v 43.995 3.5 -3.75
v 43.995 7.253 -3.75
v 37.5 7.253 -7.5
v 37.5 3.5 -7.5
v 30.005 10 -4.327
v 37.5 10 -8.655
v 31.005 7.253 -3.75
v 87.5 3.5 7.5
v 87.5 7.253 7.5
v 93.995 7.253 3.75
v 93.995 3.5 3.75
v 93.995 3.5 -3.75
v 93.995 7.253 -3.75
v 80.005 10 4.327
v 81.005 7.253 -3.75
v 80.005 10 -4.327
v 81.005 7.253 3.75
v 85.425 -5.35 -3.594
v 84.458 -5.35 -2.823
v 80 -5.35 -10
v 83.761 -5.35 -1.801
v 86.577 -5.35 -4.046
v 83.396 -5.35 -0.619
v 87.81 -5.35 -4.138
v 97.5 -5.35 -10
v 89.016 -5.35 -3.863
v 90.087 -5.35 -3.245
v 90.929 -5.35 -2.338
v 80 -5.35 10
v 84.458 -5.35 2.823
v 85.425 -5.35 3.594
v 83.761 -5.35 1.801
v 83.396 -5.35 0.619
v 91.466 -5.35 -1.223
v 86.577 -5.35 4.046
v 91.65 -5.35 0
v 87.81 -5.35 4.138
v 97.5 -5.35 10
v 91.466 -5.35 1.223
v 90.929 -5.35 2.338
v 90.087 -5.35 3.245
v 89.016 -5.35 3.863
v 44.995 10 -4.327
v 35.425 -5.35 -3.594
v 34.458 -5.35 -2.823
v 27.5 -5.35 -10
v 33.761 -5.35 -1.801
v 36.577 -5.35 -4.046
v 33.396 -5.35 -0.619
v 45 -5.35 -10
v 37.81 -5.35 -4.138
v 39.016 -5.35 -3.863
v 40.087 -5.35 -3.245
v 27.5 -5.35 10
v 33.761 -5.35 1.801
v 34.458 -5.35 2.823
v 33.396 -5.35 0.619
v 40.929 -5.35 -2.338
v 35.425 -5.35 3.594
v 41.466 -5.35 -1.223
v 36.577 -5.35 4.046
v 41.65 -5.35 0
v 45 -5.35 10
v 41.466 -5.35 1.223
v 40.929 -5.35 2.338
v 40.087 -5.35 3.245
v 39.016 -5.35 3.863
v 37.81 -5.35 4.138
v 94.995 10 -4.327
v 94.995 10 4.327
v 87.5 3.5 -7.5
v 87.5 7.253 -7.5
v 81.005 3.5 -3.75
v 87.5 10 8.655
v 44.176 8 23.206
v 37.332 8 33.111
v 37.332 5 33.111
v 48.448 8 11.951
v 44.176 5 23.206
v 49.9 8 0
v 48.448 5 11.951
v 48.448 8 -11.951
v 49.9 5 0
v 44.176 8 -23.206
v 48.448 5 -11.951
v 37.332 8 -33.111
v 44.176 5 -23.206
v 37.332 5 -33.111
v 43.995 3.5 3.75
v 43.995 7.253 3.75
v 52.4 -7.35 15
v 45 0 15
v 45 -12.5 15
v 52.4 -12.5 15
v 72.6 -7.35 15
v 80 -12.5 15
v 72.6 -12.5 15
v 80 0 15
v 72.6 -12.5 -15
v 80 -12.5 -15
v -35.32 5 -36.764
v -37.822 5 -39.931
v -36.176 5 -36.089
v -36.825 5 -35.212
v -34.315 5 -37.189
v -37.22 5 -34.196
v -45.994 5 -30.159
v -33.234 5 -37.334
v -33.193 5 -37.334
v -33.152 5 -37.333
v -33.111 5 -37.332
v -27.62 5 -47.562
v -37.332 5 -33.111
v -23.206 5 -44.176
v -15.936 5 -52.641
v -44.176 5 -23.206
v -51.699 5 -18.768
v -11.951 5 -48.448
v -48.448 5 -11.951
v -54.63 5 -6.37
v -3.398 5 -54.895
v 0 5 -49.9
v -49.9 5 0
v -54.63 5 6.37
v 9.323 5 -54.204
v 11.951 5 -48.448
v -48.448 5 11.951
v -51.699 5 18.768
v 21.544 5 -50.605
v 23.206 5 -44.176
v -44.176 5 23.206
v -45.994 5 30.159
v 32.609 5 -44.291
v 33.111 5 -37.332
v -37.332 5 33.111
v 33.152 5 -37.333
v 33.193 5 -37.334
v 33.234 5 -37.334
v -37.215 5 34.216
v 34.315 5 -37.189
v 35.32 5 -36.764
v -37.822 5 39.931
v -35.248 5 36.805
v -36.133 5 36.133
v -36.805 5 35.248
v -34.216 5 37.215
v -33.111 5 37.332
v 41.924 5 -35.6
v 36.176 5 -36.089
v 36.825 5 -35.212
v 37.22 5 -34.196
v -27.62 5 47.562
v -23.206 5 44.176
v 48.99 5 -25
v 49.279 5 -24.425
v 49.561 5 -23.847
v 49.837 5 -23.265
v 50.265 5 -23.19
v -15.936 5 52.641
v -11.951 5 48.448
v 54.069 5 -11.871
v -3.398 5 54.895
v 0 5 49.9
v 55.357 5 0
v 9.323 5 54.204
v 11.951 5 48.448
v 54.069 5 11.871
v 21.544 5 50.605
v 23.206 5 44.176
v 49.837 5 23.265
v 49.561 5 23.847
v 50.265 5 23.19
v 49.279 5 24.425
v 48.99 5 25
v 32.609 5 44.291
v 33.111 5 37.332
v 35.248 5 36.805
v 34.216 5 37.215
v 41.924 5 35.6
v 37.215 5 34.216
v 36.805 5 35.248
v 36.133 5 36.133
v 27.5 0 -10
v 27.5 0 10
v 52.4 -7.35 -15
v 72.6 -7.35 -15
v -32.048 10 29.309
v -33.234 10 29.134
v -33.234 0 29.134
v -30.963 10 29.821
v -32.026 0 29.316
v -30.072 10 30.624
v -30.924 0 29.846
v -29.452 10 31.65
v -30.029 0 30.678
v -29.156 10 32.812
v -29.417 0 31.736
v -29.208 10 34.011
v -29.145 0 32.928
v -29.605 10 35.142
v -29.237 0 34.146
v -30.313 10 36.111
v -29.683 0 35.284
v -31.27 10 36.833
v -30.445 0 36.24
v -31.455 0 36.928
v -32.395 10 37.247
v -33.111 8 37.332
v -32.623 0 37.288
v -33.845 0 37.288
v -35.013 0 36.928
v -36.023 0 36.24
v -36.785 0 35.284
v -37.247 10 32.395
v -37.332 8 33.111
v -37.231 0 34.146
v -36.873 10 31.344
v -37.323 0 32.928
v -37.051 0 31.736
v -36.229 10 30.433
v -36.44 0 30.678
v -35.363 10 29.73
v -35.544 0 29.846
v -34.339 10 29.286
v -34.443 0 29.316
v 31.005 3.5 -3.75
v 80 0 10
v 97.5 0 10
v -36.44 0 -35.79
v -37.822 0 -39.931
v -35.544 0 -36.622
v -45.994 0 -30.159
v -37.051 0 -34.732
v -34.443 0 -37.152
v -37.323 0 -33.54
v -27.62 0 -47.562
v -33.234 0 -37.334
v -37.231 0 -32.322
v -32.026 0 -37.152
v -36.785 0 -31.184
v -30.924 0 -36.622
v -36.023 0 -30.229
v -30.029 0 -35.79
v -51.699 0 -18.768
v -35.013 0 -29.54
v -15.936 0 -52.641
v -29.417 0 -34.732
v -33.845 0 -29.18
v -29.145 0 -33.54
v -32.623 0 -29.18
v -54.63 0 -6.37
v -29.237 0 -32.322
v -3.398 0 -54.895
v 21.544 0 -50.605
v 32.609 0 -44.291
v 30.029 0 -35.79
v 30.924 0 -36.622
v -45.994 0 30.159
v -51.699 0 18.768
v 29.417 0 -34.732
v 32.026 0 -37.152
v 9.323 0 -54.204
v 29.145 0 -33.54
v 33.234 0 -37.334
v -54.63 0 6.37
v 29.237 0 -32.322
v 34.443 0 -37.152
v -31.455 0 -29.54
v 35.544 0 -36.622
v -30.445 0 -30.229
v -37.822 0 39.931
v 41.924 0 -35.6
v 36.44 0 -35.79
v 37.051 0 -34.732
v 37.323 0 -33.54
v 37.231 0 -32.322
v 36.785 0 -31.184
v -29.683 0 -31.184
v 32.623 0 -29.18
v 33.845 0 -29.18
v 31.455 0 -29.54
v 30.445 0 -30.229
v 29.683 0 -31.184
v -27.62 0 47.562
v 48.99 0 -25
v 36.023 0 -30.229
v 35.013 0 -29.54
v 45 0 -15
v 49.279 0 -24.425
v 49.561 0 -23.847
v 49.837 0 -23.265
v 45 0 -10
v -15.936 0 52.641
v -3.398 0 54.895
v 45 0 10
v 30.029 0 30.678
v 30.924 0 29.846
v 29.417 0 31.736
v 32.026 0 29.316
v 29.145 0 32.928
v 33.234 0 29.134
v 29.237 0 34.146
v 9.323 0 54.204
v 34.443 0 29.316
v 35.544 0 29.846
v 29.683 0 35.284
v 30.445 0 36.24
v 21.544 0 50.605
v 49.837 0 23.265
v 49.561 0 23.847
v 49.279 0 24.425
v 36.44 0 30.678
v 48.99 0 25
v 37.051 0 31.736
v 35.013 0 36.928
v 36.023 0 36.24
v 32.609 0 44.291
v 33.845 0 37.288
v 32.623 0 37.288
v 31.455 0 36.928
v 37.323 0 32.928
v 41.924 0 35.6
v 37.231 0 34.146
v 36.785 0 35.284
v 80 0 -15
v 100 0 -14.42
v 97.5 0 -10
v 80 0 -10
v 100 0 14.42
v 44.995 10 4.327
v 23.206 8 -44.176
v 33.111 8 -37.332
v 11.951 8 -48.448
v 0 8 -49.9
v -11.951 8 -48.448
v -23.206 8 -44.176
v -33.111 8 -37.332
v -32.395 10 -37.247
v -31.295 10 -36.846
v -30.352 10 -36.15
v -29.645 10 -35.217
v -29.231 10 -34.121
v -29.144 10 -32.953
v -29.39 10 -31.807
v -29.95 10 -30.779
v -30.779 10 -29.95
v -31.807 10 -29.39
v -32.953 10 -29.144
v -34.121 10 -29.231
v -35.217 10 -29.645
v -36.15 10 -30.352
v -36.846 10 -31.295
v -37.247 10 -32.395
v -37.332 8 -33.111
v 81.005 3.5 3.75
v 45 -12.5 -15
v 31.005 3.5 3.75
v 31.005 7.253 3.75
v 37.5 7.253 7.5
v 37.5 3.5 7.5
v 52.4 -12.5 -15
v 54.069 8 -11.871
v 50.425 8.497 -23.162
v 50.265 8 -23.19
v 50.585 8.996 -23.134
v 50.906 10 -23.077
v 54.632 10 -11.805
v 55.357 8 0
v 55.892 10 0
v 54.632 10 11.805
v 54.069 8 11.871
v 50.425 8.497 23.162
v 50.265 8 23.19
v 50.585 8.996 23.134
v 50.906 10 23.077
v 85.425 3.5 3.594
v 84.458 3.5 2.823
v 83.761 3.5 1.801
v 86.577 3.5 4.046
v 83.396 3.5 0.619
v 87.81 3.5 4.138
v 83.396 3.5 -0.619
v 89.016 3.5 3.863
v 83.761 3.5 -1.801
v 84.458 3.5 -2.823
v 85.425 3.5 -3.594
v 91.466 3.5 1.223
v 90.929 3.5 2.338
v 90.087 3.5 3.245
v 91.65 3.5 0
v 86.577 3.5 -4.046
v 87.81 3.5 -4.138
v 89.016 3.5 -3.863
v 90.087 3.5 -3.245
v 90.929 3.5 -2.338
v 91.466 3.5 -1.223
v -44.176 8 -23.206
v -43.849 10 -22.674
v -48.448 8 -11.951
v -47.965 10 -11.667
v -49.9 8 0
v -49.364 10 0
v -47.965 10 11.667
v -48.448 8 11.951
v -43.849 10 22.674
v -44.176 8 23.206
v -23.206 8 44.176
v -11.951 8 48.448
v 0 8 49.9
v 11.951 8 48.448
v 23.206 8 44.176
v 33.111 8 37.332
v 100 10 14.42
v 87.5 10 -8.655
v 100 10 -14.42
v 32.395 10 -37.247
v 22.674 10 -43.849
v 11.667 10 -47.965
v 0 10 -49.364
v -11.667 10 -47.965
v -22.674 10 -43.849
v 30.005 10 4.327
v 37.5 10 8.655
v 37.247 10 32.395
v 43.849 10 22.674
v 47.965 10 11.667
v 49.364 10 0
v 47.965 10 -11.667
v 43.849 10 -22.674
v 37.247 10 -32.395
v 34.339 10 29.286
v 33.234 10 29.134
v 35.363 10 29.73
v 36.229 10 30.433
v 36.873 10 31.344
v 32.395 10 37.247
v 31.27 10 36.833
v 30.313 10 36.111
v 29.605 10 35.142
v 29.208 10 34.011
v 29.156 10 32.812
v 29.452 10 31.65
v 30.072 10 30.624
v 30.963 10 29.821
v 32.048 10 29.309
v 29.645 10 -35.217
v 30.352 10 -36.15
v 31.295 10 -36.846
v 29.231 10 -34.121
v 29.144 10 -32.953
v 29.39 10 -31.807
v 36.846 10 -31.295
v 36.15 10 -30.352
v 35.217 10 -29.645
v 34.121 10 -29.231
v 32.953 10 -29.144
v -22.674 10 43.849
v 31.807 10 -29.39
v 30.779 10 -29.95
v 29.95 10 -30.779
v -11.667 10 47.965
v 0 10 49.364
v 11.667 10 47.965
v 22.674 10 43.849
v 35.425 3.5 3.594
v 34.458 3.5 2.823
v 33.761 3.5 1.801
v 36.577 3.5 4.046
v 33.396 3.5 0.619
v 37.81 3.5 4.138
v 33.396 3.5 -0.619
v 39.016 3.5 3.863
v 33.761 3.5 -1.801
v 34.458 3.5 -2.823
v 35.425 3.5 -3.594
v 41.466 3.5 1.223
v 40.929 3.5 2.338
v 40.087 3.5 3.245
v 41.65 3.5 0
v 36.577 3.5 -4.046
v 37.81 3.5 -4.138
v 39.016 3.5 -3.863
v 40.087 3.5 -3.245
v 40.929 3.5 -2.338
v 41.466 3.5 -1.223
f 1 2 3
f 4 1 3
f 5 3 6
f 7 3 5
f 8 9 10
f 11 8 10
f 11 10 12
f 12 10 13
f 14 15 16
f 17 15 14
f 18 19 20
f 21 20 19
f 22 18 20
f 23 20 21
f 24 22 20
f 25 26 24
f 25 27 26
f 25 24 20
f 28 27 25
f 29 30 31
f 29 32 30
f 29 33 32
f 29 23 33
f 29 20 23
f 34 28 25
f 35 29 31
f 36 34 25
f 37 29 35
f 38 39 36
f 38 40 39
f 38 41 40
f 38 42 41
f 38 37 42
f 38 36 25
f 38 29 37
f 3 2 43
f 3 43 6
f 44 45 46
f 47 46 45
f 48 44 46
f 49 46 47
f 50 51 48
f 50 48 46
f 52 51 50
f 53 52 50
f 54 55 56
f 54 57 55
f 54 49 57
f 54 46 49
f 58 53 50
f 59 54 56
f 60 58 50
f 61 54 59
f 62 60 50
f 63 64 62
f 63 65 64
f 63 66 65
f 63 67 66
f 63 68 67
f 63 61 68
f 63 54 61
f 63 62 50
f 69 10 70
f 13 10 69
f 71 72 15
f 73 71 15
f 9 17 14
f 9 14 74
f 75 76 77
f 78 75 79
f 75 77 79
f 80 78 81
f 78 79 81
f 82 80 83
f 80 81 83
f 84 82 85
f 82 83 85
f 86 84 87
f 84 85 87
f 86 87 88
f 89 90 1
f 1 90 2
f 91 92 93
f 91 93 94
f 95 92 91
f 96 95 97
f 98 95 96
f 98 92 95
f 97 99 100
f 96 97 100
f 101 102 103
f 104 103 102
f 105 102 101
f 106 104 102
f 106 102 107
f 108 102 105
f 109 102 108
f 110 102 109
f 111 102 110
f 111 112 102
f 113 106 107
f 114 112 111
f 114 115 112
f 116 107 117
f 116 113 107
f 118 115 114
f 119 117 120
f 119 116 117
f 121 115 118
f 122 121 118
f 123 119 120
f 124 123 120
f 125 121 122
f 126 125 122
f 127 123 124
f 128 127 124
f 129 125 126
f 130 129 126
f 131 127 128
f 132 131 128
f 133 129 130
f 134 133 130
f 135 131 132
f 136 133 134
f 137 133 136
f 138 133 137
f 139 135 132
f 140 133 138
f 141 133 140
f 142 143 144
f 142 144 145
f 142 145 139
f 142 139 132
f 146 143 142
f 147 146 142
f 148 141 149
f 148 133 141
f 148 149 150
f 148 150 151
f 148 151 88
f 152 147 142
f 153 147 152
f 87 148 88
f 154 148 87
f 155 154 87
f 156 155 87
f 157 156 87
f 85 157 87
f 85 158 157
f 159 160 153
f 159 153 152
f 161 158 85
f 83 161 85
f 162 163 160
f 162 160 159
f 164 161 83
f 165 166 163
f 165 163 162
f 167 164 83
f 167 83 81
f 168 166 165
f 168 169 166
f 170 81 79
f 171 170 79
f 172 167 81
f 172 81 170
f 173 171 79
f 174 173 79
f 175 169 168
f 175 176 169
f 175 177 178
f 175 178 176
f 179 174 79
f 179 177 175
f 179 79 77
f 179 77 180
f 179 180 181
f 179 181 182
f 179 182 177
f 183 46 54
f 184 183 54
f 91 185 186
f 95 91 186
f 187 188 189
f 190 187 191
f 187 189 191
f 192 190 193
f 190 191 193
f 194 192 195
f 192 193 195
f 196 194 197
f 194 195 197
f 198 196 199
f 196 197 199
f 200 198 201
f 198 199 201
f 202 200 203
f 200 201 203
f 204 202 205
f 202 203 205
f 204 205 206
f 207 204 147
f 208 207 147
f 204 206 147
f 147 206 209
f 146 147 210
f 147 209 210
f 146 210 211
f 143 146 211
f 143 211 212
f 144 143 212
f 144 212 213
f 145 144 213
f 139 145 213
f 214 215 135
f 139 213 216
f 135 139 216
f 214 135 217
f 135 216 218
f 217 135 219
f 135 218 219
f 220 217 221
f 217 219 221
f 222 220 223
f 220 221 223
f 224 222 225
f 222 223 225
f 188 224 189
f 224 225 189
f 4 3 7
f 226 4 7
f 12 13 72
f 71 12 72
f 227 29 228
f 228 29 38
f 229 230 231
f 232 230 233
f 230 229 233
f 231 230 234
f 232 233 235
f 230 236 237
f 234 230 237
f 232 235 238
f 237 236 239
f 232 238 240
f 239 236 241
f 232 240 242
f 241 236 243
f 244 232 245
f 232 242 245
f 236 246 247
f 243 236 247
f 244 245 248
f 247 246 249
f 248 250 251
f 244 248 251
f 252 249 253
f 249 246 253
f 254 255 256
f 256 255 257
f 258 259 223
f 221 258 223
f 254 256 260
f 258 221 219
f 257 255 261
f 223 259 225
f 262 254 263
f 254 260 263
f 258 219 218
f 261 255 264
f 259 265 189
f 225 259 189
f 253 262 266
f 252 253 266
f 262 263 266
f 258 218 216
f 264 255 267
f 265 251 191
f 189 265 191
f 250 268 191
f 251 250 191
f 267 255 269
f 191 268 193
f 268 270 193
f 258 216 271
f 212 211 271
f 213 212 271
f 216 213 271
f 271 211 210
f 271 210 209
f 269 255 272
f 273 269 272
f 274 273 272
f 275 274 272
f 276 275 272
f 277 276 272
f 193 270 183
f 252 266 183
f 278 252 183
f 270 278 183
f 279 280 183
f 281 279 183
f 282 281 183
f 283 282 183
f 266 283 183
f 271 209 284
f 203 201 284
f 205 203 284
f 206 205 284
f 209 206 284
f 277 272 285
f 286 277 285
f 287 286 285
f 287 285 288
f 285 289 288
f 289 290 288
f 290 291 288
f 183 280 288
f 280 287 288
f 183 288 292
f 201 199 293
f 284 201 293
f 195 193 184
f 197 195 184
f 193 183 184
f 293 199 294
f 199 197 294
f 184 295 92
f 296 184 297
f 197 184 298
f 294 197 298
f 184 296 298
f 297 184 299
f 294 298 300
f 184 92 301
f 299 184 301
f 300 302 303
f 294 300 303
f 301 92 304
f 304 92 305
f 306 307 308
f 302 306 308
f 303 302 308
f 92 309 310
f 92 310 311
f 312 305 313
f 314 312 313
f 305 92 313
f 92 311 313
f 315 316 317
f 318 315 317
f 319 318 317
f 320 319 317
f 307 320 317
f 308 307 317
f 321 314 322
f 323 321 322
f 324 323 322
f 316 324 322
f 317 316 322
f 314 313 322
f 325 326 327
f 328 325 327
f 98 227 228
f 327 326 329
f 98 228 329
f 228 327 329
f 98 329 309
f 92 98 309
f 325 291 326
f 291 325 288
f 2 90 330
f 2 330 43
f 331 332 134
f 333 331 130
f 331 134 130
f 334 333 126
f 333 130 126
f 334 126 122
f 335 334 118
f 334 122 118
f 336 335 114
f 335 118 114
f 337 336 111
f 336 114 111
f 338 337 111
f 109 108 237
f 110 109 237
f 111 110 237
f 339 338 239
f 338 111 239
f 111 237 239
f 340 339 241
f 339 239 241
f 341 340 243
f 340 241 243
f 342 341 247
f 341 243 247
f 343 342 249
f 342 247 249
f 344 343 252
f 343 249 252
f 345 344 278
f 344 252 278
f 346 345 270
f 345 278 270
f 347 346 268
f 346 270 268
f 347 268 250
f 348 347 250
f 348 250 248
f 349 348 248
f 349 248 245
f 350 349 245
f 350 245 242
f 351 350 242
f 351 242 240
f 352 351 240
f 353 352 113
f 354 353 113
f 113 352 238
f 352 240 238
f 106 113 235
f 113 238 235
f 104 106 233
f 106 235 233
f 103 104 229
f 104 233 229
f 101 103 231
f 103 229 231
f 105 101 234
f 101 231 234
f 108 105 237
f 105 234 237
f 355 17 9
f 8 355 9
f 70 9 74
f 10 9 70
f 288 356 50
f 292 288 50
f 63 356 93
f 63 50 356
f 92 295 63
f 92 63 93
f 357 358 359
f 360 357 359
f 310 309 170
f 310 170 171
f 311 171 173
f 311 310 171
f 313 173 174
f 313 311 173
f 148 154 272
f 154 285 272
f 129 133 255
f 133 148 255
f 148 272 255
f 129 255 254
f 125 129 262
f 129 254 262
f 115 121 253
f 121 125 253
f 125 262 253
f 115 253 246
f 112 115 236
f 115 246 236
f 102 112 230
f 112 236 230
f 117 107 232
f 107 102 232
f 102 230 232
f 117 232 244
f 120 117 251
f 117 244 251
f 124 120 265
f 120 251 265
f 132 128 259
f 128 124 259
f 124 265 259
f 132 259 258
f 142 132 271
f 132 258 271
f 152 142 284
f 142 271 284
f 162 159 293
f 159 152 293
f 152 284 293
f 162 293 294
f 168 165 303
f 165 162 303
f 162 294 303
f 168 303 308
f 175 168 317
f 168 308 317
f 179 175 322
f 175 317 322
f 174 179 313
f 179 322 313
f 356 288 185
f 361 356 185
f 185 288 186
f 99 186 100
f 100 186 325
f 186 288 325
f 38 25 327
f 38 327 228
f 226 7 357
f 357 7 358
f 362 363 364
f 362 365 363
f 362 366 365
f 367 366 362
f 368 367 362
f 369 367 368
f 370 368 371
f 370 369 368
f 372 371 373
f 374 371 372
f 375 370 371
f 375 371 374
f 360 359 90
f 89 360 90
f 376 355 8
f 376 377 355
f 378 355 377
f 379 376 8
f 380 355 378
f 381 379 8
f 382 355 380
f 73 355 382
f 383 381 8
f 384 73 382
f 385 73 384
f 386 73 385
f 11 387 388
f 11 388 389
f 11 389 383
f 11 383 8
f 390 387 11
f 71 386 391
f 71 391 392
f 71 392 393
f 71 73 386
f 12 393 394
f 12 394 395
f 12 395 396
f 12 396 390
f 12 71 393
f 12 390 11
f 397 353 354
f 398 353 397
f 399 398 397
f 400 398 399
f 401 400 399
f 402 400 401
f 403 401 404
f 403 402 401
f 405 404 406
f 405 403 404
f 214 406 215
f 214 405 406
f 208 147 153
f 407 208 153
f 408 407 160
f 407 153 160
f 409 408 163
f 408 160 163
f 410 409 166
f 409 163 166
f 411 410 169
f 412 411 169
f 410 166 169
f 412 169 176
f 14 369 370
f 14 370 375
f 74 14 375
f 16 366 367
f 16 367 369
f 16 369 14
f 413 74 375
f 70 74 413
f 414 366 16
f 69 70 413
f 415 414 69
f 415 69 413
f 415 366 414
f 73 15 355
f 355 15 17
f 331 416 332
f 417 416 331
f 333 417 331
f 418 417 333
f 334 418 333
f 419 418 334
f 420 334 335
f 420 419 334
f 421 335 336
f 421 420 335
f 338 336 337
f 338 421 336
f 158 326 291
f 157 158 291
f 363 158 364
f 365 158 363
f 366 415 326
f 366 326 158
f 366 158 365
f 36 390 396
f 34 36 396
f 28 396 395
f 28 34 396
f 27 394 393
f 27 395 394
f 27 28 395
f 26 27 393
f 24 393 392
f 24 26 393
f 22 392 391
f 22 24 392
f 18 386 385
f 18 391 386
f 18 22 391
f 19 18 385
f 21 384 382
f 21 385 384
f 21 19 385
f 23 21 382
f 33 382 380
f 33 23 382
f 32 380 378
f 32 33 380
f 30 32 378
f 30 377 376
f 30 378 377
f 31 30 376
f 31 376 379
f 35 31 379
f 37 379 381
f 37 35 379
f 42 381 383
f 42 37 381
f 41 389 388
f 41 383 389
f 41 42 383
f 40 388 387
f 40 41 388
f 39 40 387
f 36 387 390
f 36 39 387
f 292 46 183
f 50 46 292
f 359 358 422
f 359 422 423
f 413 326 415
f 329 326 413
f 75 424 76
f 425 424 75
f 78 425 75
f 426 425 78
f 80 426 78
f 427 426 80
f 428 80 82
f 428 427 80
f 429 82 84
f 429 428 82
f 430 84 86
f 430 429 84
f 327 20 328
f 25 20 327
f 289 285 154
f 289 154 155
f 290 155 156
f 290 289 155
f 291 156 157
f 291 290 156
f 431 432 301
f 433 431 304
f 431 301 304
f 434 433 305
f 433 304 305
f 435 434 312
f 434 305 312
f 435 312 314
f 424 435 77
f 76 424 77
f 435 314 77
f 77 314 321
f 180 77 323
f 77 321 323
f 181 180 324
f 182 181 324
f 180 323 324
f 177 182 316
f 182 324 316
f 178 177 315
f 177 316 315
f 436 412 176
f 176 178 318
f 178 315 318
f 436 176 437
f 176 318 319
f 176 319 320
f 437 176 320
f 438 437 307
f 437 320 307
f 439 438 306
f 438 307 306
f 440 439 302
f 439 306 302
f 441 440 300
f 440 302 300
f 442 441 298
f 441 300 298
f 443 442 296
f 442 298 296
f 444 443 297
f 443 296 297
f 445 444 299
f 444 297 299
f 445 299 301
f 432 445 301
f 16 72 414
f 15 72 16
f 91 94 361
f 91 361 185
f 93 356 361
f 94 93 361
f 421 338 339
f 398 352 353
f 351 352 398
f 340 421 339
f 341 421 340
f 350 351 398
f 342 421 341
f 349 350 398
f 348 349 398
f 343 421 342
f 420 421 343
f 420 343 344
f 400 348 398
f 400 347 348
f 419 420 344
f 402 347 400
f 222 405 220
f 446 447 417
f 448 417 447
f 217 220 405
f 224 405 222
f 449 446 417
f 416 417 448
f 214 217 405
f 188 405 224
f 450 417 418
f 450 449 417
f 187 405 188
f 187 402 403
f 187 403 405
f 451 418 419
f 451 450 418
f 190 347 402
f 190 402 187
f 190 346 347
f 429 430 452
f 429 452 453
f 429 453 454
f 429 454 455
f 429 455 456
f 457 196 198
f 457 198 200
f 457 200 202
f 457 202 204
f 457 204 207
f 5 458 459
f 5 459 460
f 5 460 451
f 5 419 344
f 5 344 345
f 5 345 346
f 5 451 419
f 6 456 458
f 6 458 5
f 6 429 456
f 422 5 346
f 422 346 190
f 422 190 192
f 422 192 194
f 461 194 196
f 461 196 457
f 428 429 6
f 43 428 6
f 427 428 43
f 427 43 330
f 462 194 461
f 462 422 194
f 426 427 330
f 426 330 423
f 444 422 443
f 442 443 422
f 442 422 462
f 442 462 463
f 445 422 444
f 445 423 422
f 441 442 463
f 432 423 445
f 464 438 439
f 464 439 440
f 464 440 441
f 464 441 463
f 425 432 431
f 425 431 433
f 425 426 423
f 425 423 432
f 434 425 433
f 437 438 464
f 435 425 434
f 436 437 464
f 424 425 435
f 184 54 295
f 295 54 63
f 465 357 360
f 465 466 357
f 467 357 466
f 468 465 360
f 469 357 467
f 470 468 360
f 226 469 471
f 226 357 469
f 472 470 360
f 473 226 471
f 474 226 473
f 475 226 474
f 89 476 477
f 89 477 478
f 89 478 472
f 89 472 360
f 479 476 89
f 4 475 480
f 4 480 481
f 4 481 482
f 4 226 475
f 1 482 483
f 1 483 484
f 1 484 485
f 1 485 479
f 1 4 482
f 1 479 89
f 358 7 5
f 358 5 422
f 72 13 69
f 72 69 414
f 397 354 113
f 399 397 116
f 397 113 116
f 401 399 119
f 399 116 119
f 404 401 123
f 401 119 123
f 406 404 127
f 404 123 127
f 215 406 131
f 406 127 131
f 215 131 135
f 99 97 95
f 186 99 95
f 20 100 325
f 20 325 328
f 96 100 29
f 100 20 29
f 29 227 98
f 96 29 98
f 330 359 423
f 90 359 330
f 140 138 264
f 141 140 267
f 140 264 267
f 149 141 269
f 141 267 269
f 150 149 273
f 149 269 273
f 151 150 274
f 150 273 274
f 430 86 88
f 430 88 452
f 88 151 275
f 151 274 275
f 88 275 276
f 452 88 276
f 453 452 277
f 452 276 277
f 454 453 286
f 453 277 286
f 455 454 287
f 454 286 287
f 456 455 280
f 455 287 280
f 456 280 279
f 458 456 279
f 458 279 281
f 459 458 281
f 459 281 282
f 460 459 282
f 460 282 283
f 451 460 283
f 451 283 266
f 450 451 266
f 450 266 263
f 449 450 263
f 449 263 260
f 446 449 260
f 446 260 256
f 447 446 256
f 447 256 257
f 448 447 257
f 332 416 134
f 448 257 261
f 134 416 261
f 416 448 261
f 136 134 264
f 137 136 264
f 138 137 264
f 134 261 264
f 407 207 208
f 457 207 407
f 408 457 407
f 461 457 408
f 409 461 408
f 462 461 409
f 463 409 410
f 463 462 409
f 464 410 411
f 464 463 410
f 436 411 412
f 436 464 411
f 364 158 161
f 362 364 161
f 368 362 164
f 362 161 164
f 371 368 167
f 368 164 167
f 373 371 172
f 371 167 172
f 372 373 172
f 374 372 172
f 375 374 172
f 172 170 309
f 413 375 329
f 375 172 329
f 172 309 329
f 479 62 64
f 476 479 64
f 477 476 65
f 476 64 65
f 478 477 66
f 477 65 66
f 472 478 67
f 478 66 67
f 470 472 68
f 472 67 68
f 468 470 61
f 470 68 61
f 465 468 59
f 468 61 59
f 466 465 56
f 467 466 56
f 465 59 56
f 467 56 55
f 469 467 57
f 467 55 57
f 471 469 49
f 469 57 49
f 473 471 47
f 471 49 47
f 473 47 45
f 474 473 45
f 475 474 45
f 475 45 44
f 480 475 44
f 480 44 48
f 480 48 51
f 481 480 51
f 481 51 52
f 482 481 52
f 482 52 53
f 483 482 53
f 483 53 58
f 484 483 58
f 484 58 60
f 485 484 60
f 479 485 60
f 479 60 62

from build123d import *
from OCP.BRepFilletAPI import BRepFilletAPI_MakeChamfer

# Parameters (mm, degrees)
SKETCH_1_R          = 55
EXTRUDE_1_DEPTH     = 5
SKETCH_2_R          = 49.9
EXTRUDE_2_DEPTH     = 5
SKETCH7_W           = 51.010205144
SKETCH7_H           = 50
BOSS_EXTRUDE2_DEPTH = 5
SKETCH_3_W          = 35
SKETCH_3_H          = 30
EXTRUDE_3_DEPTH     = 25
SKETCH_4_W          = 20.2
SKETCH_4_H          = 10.3
CUT_EXTRUDE_1_DEPTH = 125.599357944
SKETCH_5_R          = 4.1
CUT_EXTRUDE_2_DEPTH = 117.833214455
CHAMFER1_SIZE       = 2
CHAMFER1_SIZE2      = 0.535898385
SKETCH2_W           = 35
SKETCH2_H           = 30
CUT_EXTRUDE1_DEPTH  = 12.5
BOSS_EXTRUDE1_START = -2
SKETCH4_W           = 70
SKETCH4_H           = 20
BOSS_EXTRUDE1_DEPTH = 5.35
SKETCH5_R           = 4.15
CUT_EXTRUDE2_DEPTH  = 116.154776293
SKETCH9_R           = 4.15
BOSS_EXTRUDE3_DEPTH = 5
CHAMFER3_SIZE       = 2
CHAMFER3_SIZE2      = 0.535898385
CUT_EXTRUDE3_DEPTH  = 6.5
CHAMFER2_SIZE       = 1
CHAMFER2_SIZE2      = 2.747477419
CHAMFER4_SIZE       = 10.579618843
CHAMFER4_SIZE_2     = 60


with BuildPart() as part:
    # Эскиз1 → Бобышка-Вытянуть1 (new body)
    with BuildSketch(Plane(origin=(0, 0, 0), x_dir=(1, 0, 0), z_dir=(0, 1, 0))):
        with Locations(Location((0, 0, 0), (0, 0, 270))):
            Circle(SKETCH_1_R)
    extrude(amount=EXTRUDE_1_DEPTH)

    # Эскиз2 → Бобышка-Вытянуть2 (add)
    with BuildSketch(Plane(origin=(0, 5, 0), x_dir=(1, 0, 0), z_dir=(0, 1, 0))):
        with Locations(Location((0, 0, 0), (0, 0, 270))):
            Circle(SKETCH_2_R)
    extrude(amount=EXTRUDE_2_DEPTH)

    # Sketch7 → Boss-Extrude2 (add)
    with BuildSketch(Plane.XZ):
        with Locations((74.494897428, 0)):
            Rectangle(SKETCH7_W, SKETCH7_H)
    extrude(amount=-BOSS_EXTRUDE2_DEPTH)

    # Эскиз3 → Бобышка-Вытянуть3 (add)
    with BuildSketch(Plane.XZ):
        with Locations((62.5, 0)):
            Rectangle(SKETCH_3_W, SKETCH_3_H)
    extrude(amount=EXTRUDE_3_DEPTH)

    # Эскиз4 → Вырез-Вытянуть1 (cut, through all)
    with BuildSketch(Plane.XY.offset(15)):
        with Locations((62.5, -12.5)):
            Rectangle(SKETCH_4_W, SKETCH_4_H)
    extrude(amount=-CUT_EXTRUDE_1_DEPTH, mode=Mode.SUBTRACT)

    # Эскиз5 → Вырез-Вытянуть2 (cut, through all)
    with BuildSketch(Plane.XZ):
        with Locations(Location((33.234018716, -33.234018716, 0), (0, 0, 270))):
            Circle(SKETCH_5_R)
        with Locations(Location((-33.234018716, -33.234018716, 0), (0, 0, 270))):
            Circle(SKETCH_5_R)
        with Locations(Location((-33.234018716, 33.234018716, 0), (0, 0, 270))):
            Circle(SKETCH_5_R)
        with Locations(Location((33.234018716, 33.234018716, 0), (0, 0, 270))):
            Circle(SKETCH_5_R)
    extrude(amount=-CUT_EXTRUDE_2_DEPTH, mode=Mode.SUBTRACT)

    # Chamfer1: one chamfer whose edges measure the first distance from different faces: ONE call of the kernel's chamfer builder (chamfer() names one face for all edges)
    chamfer1_edges_1 = [part.edges().sort_by_distance(p)[0] for p in [
        (0, 10, -49.9),
    ]]
    chamfer1_side_1 = [part.faces().sort_by_distance(p)[0] for p in [
        (0, 7.5, -49.9),
    ]]
    chamfer1_edges_2 = [part.edges().sort_by_distance(p)[0] for p in [
        (-49.9, 10, 0),
    ]]
    chamfer1_side_2 = [part.faces().sort_by_distance(p)[0] for p in [
        (-49.9, 7.5, 0),
    ]]
    chamfer1_edges_3 = [part.edges().sort_by_distance(p)[0] for p in [
        (0, 10, 49.9),
    ]]
    chamfer1_side_3 = [part.faces().sort_by_distance(p)[0] for p in [
        (0, 7.5, 49.9),
    ]]
    chamfer1_edges_4 = [part.edges().sort_by_distance(p)[0] for p in [
        (49.9, 10, 0),
    ]]
    chamfer1_side_4 = [part.faces().sort_by_distance(p)[0] for p in [
        (49.9, 7.5, 0),
    ]]
    chamfer1 = BRepFilletAPI_MakeChamfer(part.part.solid().wrapped)
    for e in chamfer1_edges_1:
        chamfer1.Add(CHAMFER1_SIZE, CHAMFER1_SIZE2, e.wrapped, chamfer1_side_1[0].wrapped)  # the first distance lies on this face
    for e in chamfer1_edges_2:
        chamfer1.Add(CHAMFER1_SIZE, CHAMFER1_SIZE2, e.wrapped, chamfer1_side_2[0].wrapped)  # the first distance lies on this face
    for e in chamfer1_edges_3:
        chamfer1.Add(CHAMFER1_SIZE, CHAMFER1_SIZE2, e.wrapped, chamfer1_side_3[0].wrapped)  # the first distance lies on this face
    for e in chamfer1_edges_4:
        chamfer1.Add(CHAMFER1_SIZE, CHAMFER1_SIZE2, e.wrapped, chamfer1_side_4[0].wrapped)  # the first distance lies on this face
    add(Compound.cast(chamfer1.Shape()), mode=Mode.REPLACE)

    # Sketch2 → Cut-Extrude1 (cut)
    with BuildSketch(Plane.XZ.offset(25)):
        with Locations((62.5, 0)):
            Rectangle(SKETCH2_W, SKETCH2_H)
    extrude(amount=-CUT_EXTRUDE1_DEPTH, mode=Mode.SUBTRACT)

    # Sketch4 → Boss-Extrude1 (add)
    with BuildSketch(Plane.XZ.offset(7.35).offset(BOSS_EXTRUDE1_START)):
        with Locations((62.5, 0)):
            Rectangle(SKETCH4_W, SKETCH4_H)
    extrude(amount=-BOSS_EXTRUDE1_DEPTH)

    # Sketch5 → Cut-Extrude2 (cut, through all)
    with BuildSketch(Plane.XZ.offset(5.35)):
        with Locations((87.5, 0)):
            Circle(SKETCH5_R)
        with Locations((37.5, 0)):
            Circle(SKETCH5_R)
    extrude(amount=-CUT_EXTRUDE2_DEPTH, mode=Mode.SUBTRACT)

    # Sketch9 → Boss-Extrude3 (add)
    # profile 1 of 2: a face of its own
    with BuildSketch(Plane(origin=(0, 5, 0), x_dir=(1, 0, 0), z_dir=(0, 1, 0))):
        with Locations((37.5, 0)):
            Circle(SKETCH9_R)
    # profile 2 of 2: a face of its own
    with BuildSketch(Plane(origin=(0, 5, 0), x_dir=(1, 0, 0), z_dir=(0, 1, 0))):
        with BuildLine():
            Line((49.389794856, -25), (100, -25))
            Line((100, -25), (100, 25))
            Line((100, 25), (49.389794856, 25))
            ThreePointArc((49.389794856, 25), (55.356588008, 0), (49.389794856, -25))
        make_face()
        with Locations((87.5, 0)):
            Circle(SKETCH9_R, mode=Mode.SUBTRACT)
    extrude(amount=BOSS_EXTRUDE3_DEPTH)

    # Chamfer3
    chamfer3_edges = [part.edges().sort_by_distance(p)[0] for p in [
        (55.356588008, 10, 0),
    ]]
    chamfer3_side = [part.faces().sort_by_distance(p)[0] for p in [
        (55.356588008, 7.5, 0),
    ]]
    chamfer(chamfer3_edges, length=CHAMFER3_SIZE, length2=CHAMFER3_SIZE2, reference=chamfer3_side[0])

    # Sketch6 → Cut-Extrude3 (cut)
    with BuildSketch(Plane(origin=(0, 10, 0), x_dir=(1, 0, 0), z_dir=(0, 1, 0))):
        Polygon((43.995190528, 3.75), (37.5, 7.5), (31.004809472, 3.75), (31.004809472, -3.75), (37.5, -7.5), (43.995190528, -3.75), align=None)
        Polygon((93.995190528, 3.75), (87.5, 7.5), (81.004809472, 3.75), (81.004809472, -3.75), (87.5, -7.5), (93.995190528, -3.75), align=None)
    extrude(amount=-CUT_EXTRUDE3_DEPTH, mode=Mode.SUBTRACT)

    # Chamfer2: one chamfer whose edges measure the first distance from different faces: ONE call of the kernel's chamfer builder (chamfer() names one face for all edges)
    chamfer2_edges_1 = [part.edges().sort_by_distance(p)[0] for p in [
        (43.995190528, 10, 0),
        (40.747595264, 10, -5.625),
        (34.252404736, 10, -5.625),
        (31.004809472, 10, 0),
        (34.252404736, 10, 5.625),
        (40.747595264, 10, 5.625),
    ]]
    chamfer2_side_1 = [part.faces().sort_by_distance(p)[0] for p in [
        (-0.7474754, 10, 0),
    ]]
    chamfer2_edges_2 = [part.edges().sort_by_distance(p)[0] for p in [
        (93.995190528, 10, 0),
        (90.747595264, 10, -5.625),
        (84.252404736, 10, -5.625),
        (81.004809472, 10, 0),
        (84.252404736, 10, 5.625),
        (90.747595264, 10, 5.625),
    ]]
    chamfer2_side_2 = [part.faces().sort_by_distance(p)[0] for p in [
        (76.23589774, 10, 0),
    ]]
    chamfer2 = BRepFilletAPI_MakeChamfer(part.part.solid().wrapped)
    for e in chamfer2_edges_1:
        chamfer2.Add(CHAMFER2_SIZE, CHAMFER2_SIZE2, e.wrapped, chamfer2_side_1[0].wrapped)  # the first distance lies on this face
    for e in chamfer2_edges_2:
        chamfer2.Add(CHAMFER2_SIZE, CHAMFER2_SIZE2, e.wrapped, chamfer2_side_2[0].wrapped)  # the first distance lies on this face
    add(Compound.cast(chamfer2.Shape()), mode=Mode.REPLACE)

    # Chamfer4
    # the kernel refuses this chamfer: 60, 10.579618843 mm, written as the material it takes off along each edge
    with BuildSketch(Plane(origin=(100, 165.912327785, -25), x_dir=(0.21013876076743138, 0, 0.9776715712462587), z_dir=(0, -1, 0))) as chamfer4_piece_1_section:
        Polygon((CHAMFER4_SIZE * 0.977671571201, CHAMFER4_SIZE * 0.210138760758), (-CHAMFER4_SIZE_2 * 0.210138760767, CHAMFER4_SIZE_2 * 0.977671571246), (0, 0), align=None)
    chamfer4_piece_1 = extrude(amount=321.824655571, mode=Mode.PRIVATE)
    chamfer4_piece_1 = chamfer4_piece_1 - Plane(origin=(0, 7.498692245, 0), x_dir=(0, 0, 1), z_dir=(0, -1, 0)) * Cylinder(55, 879, mode=Mode.PRIVATE)
    add(chamfer4_piece_1, mode=Mode.SUBTRACT)
    with BuildSketch(Plane(origin=(100, -155.912327785, 25), x_dir=(-0.9999776716360547, 0, 0.006682531656101301), z_dir=(0, 1, 0))) as chamfer4_piece_2_section:
        Polygon((CHAMFER4_SIZE_2 * 0.999977671636, -CHAMFER4_SIZE_2 * 0.0066825316561), (-CHAMFER4_SIZE * 0.00668253165579, -CHAMFER4_SIZE * 0.99997767159), (0, 0), align=None)
    chamfer4_piece_2 = extrude(amount=321.824655571, mode=Mode.PRIVATE)
    chamfer4_piece_2 = chamfer4_piece_2 - Plane(origin=(0, 2.5, 0), x_dir=(0, 0, 1), z_dir=(0, -1, 0)) * Cylinder(55, 884, mode=Mode.PRIVATE)
    add(chamfer4_piece_2, mode=Mode.SUBTRACT)


solid = part.part
